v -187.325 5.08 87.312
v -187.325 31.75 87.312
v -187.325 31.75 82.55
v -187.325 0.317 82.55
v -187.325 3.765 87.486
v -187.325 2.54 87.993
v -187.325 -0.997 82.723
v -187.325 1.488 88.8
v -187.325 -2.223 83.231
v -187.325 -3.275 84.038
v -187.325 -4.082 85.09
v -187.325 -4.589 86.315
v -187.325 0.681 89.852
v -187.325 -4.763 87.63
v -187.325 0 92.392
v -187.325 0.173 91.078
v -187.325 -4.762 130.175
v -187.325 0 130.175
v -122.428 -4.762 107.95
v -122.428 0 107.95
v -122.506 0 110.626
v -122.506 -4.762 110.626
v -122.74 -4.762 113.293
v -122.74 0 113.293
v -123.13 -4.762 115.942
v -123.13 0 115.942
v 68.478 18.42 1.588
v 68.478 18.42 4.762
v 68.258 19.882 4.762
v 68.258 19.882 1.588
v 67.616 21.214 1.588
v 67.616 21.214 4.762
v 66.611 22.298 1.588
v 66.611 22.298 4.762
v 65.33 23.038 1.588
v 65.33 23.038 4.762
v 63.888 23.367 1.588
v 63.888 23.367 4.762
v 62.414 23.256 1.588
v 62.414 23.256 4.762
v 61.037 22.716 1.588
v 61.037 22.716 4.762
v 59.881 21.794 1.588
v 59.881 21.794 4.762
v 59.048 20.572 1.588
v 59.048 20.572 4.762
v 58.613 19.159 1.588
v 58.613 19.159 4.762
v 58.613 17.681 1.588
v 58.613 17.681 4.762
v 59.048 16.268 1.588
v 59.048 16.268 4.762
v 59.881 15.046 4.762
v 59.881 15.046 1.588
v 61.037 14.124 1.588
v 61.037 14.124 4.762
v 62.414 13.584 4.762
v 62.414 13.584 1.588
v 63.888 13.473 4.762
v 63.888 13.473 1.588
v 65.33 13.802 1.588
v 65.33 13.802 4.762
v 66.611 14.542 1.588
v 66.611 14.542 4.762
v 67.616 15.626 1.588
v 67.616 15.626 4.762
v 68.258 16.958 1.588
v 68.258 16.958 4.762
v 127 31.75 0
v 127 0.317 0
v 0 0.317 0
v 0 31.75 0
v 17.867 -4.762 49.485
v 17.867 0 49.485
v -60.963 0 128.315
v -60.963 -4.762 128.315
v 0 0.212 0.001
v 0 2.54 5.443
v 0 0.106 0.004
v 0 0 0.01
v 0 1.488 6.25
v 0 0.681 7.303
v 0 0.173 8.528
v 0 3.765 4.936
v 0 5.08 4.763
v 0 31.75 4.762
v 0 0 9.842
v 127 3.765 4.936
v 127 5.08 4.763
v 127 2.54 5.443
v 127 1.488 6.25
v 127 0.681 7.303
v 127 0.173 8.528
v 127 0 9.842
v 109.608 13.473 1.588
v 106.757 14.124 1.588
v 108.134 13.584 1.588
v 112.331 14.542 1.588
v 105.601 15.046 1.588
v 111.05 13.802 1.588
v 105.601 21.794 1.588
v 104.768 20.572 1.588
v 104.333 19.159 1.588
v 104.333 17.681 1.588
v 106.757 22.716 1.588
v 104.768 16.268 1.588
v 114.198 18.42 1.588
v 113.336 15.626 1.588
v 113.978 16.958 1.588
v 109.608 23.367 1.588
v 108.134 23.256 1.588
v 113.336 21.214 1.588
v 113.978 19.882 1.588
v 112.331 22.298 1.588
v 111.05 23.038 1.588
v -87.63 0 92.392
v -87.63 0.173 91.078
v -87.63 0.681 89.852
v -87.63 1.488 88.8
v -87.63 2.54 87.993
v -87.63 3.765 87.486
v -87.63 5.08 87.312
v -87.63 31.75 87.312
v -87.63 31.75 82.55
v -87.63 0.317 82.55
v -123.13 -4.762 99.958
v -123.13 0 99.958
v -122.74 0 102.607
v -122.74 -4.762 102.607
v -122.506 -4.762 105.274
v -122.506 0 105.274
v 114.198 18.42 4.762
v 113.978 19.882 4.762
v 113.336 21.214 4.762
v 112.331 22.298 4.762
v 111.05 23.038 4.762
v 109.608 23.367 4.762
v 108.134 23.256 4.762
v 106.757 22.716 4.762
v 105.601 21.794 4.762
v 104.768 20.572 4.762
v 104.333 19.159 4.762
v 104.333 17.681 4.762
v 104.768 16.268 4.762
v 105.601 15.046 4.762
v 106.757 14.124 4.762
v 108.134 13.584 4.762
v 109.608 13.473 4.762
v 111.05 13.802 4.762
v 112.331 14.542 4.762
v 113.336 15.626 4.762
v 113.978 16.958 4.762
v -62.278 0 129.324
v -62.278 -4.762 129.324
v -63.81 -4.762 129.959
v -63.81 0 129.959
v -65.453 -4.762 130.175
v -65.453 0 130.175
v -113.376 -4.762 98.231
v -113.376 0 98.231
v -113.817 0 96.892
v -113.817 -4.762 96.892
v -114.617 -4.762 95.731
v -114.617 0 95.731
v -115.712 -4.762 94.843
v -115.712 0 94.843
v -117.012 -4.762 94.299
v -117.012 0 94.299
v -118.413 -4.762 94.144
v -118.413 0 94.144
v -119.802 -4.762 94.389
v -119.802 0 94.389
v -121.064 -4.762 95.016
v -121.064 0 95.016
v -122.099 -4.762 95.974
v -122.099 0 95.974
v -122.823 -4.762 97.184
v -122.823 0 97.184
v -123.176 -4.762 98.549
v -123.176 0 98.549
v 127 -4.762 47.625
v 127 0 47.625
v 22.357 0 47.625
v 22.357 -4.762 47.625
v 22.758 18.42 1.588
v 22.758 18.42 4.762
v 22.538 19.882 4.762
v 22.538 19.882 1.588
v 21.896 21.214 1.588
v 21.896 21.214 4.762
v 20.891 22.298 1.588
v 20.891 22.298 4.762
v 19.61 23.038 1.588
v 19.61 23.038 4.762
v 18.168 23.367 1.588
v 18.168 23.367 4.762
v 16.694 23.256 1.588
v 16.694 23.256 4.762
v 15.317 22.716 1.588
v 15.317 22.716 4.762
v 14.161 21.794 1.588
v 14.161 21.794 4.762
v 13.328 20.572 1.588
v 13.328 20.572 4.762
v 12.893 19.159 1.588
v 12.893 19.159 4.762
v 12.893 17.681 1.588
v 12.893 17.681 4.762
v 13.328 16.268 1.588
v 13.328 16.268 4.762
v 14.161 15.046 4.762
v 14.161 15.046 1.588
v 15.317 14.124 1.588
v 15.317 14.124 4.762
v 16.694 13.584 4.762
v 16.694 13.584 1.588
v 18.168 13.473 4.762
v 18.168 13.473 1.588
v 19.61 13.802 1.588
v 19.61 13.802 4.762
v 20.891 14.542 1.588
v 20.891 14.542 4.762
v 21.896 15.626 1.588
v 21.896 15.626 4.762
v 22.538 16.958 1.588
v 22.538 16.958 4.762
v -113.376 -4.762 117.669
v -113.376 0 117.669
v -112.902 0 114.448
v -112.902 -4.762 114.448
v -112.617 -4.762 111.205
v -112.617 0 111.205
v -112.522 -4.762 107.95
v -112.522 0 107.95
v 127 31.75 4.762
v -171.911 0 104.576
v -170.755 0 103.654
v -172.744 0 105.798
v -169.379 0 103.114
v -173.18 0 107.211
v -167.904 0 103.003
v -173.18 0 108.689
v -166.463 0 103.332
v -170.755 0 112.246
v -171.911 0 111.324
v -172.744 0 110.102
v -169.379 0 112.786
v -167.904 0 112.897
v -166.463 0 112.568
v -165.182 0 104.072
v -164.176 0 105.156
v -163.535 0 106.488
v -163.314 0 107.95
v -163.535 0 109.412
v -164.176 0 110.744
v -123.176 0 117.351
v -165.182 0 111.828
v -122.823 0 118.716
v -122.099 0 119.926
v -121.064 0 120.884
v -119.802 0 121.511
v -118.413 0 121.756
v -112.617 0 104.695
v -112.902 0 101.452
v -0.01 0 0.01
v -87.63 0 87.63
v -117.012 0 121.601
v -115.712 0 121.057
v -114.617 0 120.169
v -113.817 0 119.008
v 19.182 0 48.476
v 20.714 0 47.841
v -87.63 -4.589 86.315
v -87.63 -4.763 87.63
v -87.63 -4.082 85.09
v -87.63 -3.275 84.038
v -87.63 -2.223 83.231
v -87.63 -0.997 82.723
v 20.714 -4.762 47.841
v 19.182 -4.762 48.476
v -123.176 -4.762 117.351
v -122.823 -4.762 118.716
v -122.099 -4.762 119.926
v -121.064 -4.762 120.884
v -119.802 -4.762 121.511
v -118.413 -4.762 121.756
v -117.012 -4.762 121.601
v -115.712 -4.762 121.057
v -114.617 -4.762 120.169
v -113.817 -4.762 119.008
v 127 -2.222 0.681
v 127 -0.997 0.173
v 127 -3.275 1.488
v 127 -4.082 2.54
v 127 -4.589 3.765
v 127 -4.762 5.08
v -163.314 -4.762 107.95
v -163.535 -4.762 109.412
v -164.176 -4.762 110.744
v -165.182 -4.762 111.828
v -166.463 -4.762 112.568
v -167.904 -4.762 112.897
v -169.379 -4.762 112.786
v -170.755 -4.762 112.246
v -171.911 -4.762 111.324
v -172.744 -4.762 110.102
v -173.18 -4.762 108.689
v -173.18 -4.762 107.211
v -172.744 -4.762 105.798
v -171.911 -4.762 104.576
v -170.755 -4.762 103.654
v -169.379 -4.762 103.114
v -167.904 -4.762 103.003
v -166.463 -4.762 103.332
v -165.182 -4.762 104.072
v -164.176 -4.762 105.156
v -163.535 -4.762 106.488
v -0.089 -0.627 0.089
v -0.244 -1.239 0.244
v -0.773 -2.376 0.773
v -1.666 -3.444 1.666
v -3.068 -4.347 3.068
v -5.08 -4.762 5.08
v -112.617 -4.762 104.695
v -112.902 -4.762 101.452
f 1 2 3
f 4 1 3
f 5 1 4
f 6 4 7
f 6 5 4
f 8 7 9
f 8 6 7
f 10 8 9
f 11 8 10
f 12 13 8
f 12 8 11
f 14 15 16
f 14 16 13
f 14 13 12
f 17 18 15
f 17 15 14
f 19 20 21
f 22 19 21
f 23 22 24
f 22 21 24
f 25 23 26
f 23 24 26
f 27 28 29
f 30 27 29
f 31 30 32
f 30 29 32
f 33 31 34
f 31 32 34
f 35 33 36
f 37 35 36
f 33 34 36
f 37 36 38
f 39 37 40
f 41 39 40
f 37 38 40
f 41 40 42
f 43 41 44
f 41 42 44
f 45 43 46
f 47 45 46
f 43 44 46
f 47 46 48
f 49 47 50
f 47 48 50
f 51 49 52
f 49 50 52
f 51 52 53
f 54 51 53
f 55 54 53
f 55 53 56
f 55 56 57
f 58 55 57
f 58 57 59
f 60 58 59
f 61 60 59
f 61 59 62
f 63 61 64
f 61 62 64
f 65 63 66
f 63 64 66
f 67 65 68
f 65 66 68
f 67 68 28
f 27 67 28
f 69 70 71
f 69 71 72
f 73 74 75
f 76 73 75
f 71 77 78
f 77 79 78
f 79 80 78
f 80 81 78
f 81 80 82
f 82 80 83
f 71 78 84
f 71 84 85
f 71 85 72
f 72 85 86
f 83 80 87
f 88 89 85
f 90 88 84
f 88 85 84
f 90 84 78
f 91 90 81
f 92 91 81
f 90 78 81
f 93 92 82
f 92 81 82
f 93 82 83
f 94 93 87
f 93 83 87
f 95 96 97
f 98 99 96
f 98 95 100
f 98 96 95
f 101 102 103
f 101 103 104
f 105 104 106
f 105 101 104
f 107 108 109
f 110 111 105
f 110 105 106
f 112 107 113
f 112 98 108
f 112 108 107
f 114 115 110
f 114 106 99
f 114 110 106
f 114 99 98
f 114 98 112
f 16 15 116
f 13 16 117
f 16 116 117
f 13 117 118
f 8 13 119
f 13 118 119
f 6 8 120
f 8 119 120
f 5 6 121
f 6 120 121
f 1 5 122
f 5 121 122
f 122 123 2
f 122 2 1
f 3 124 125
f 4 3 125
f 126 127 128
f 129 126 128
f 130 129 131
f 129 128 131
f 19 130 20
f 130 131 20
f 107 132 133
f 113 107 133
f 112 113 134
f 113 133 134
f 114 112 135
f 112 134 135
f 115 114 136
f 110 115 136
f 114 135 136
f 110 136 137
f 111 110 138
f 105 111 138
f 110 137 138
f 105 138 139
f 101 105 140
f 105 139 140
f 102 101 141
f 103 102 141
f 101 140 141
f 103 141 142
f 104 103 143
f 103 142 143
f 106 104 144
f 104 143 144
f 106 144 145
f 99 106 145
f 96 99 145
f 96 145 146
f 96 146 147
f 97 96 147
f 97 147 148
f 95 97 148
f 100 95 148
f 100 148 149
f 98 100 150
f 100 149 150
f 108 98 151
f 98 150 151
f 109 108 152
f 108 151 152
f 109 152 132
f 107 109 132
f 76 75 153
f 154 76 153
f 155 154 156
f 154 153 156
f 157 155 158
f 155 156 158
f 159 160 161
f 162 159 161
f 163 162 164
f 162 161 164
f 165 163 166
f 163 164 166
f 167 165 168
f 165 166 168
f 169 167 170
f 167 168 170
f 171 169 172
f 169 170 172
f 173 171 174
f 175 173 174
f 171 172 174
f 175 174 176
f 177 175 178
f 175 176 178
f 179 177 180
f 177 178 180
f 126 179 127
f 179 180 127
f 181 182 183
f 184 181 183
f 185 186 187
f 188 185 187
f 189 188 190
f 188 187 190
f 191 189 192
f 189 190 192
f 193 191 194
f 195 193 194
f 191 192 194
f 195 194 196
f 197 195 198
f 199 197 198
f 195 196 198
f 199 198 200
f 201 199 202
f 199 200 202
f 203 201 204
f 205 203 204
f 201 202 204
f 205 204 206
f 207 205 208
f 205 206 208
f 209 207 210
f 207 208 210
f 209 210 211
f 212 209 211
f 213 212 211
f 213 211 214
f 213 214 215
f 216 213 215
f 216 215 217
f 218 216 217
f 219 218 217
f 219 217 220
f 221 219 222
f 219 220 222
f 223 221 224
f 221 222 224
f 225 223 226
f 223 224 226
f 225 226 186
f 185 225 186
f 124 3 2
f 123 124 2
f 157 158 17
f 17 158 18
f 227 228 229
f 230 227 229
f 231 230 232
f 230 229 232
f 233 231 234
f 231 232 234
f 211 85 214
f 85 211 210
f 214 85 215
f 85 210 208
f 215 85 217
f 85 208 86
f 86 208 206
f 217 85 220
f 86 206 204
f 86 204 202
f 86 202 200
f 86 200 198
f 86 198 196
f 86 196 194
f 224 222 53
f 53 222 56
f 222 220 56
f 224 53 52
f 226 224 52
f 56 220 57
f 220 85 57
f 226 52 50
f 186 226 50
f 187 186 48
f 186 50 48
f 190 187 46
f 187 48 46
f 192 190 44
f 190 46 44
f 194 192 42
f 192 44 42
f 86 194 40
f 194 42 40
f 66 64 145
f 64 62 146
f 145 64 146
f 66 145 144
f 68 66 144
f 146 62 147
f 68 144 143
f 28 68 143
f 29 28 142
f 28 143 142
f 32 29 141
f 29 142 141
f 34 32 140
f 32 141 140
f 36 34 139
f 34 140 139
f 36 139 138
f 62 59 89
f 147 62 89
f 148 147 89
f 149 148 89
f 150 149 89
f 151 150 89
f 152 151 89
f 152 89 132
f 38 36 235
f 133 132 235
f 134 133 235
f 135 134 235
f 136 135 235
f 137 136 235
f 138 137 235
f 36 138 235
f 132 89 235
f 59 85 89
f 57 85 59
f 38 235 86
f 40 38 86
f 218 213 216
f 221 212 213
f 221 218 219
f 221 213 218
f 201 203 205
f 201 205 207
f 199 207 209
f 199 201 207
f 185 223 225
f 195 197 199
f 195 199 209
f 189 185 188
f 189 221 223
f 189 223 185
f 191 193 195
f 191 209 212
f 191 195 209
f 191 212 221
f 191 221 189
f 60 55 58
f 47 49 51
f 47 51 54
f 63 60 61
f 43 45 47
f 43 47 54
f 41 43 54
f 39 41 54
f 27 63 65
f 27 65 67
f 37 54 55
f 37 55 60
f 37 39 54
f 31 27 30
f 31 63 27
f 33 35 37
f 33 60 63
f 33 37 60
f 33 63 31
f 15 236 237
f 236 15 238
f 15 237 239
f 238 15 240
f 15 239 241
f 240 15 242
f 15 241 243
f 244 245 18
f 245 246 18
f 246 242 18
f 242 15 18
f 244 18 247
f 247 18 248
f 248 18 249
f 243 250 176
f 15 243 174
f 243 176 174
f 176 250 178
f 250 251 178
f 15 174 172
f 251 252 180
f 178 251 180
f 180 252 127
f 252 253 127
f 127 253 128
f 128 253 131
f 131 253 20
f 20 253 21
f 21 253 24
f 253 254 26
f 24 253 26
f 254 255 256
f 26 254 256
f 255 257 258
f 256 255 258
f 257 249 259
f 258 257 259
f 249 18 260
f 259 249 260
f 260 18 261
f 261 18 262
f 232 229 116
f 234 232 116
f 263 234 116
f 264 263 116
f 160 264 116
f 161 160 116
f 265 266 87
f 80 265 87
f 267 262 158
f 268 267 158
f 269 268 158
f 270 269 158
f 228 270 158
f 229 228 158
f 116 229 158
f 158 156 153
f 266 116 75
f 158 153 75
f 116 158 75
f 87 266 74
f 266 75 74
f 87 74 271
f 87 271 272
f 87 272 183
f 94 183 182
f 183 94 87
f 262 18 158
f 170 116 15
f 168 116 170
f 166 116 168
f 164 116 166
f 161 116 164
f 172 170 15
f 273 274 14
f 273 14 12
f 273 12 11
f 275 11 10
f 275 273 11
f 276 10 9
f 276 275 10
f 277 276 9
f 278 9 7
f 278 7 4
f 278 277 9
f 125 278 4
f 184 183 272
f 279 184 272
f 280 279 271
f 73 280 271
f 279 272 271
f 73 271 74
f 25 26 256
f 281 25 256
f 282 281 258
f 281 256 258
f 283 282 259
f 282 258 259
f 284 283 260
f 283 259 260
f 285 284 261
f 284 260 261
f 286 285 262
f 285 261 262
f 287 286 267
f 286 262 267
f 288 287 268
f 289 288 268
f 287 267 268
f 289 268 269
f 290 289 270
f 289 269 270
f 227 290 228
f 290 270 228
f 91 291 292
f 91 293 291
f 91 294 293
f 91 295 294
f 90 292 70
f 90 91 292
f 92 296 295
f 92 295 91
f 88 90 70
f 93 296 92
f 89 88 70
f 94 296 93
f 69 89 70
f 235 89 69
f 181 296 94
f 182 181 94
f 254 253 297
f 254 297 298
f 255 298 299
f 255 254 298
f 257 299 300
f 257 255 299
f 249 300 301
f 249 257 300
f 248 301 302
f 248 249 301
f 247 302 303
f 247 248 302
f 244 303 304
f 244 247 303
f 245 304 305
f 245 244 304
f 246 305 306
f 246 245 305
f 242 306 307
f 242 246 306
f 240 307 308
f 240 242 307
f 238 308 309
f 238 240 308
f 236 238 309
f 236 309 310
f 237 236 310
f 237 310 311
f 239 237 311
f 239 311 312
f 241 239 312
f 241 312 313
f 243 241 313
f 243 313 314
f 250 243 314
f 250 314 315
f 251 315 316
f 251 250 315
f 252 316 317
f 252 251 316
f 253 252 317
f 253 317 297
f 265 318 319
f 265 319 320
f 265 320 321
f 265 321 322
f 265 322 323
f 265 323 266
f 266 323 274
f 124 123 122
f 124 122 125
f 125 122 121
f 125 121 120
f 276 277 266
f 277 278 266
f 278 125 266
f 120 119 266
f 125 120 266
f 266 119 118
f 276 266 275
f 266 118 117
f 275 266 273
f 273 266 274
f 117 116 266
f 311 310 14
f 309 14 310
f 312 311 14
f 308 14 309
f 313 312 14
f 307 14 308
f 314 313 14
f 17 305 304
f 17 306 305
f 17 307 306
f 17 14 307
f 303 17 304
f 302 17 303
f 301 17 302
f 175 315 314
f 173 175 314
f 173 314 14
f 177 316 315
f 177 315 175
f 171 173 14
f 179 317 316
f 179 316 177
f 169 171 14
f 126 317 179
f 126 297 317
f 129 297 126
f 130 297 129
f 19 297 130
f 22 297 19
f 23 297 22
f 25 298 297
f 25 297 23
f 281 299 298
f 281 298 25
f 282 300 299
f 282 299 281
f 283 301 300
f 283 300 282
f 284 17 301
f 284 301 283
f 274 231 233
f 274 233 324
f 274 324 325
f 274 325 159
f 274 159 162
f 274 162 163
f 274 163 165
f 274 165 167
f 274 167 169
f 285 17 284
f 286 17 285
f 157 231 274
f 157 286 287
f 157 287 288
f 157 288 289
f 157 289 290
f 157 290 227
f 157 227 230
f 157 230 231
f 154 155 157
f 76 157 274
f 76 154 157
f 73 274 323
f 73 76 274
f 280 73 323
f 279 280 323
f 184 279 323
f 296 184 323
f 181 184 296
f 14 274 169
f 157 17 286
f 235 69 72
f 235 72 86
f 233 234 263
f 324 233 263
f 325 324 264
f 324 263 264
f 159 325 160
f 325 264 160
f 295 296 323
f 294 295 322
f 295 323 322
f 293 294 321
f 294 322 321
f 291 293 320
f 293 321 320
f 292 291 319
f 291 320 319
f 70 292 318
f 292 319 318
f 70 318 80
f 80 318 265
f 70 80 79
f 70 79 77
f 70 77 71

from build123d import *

# Parameters (mm, degrees)
F0_R        = 4.96062
F1_DEPTH    = 4.7625
F2_W        = 31.75
F2_H        = 4.7625
F3_DEPTH    = 127
F4_T1_DEPTH = 127
F4_T3_DEPTH = 152.4
F5_R        = 4.96062
F6_DEPTH    = 3.175
F7_W        = 31.75
F7_H        = 4.7625
F8_DEPTH    = 99.695
F9_R        = 5.08
F11_DEPTH   = 25.4


# Not quite as in the source:
# - a fillet or chamfer that OpenCascade refuses, or shapes differently, is made with other operations: its cross-section is extruded or revolved along the edge and cut away or added


with BuildPart() as f1:
    # F0 (on Front) → F1 (new body)
    with BuildSketch(Plane.XZ):
        with BuildLine():
            Line((-82.55, 82.55), (0, 0))
            Line((0, 0), (127, 0))
            Line((127, 0), (127, 47.625))
            Line((127, 47.625), (22.3571770291, 47.625))
            ThreePointArc((22.3571770291, 47.625), (19.9271372336, 48.1083649686), (17.8670489686, 49.4848719395))
            Line((17.8670489686, 49.4848719395), (-60.9632071525, 128.3151280605))
            ThreePointArc((-60.9632071525, 128.3151280605), (-63.0232954175, 129.6916350314), (-65.4533352131, 130.175))
            Line((-65.4533352131, 130.175), (-187.325, 130.175))
            Line((-187.325, 130.175), (-187.325, 82.55))
            Line((-187.325, 82.55), (-82.55, 82.55))
        make_face()
        with Locations((-168.275, 107.95)):
            Circle(F0_R, mode=Mode.SUBTRACT)
        with BuildLine():
            ThreePointArc((-113.3757178125, 117.6693530802), (-112.7358395418, 112.8283875), (-112.522, 107.95))
            ThreePointArc((-112.522, 107.95), (-112.7358395418, 103.0716125), (-113.3757178125, 98.2306469198))
            ThreePointArc((-113.3757178125, 98.2306469198), (-119.1163255014, 94.2169402337), (-123.1300321875, 99.9575479227))
            ThreePointArc((-123.1300321875, 99.9575479227), (-122.6038452724, 103.9383875), (-122.428, 107.95))
            ThreePointArc((-122.428, 107.95), (-122.6038452724, 111.9616125), (-123.1300321875, 115.9424520773))
            ThreePointArc((-123.1300321875, 115.9424520773), (-119.1163255014, 121.6830597663), (-113.3757178125, 117.6693530802))
        make_face(mode=Mode.SUBTRACT)
    extrude(amount=F1_DEPTH)

    # F2 (on face) → F3 (join)
    with BuildSketch(Plane.YZ.offset(127)):
        with Locations((15.875, 2.38125)):
            Rectangle(F2_W, F2_H)
    extrude(amount=-F3_DEPTH)

    # F4: fillet of radius 5.08 on 2 edges, made by hand

    # F4_s2 → F4_t1 (join)
    with BuildSketch(Plane.YZ):
        with BuildLine():
            ThreePointArc((5.08, 4.7625), (1.4878975516, 6.2503975516), (0, 9.8425))
            Line((0, 9.8425), (0, 4.7625))
            Line((0, 4.7625), (5.08, 4.7625))
        make_face()
    extrude(amount=F4_T1_DEPTH)

    # F4_s4 → F4_t3 (cut)
    with BuildSketch(Plane.YZ.offset(-12.7)):
        with BuildLine():
            ThreePointArc((-4.7625, 5.08), (-3.2746024484, 1.4878975516), (0.3175, 0))
            Line((0.3175, 0), (-4.7625, 0))
            Line((-4.7625, 0), (-4.7625, 5.08))
        make_face()
    extrude(amount=F4_T3_DEPTH, mode=Mode.SUBTRACT)

    # F5 (on face) → F6 (cut)
    with BuildSketch(Plane.XY.offset(4.7625)):
        with Locations((17.79778, 18.42008)):
            Circle(F5_R)
        with Locations((63.51778, 18.42008)):
            Circle(F5_R)
        with Locations((109.23778, 18.42008)):
            Circle(F5_R)
    extrude(amount=-F6_DEPTH, mode=Mode.SUBTRACT)

    # F7 (on face) → F8 (join)
    with BuildSketch(Plane(origin=(-187.325, 0, 0), x_dir=(0, -1, 0), z_dir=(-1, 0, 0))):
        with Locations((-15.875, 84.93125)):
            Rectangle(F7_W, F7_H)
    extrude(amount=-F8_DEPTH)

    # F9
    f9_edges = [f1.edges().sort_by_distance(p)[0] for p in [
        (-134.9375, -4.7625, 82.55),
        (-137.4775, 0, 87.3125),
    ]]
    fillet(f9_edges, radius=F9_R)

    # F10 (on face) → F11 (cut)
    with BuildSketch(Plane.XZ.offset(4.7625)):
        Polygon((-82.5599315833, 82.5599315833), (-87.63, 87.63), (-87.63, 82.5599315833), align=None)
    extrude(amount=-F11_DEPTH, mode=Mode.SUBTRACT)


solid = f1.part
